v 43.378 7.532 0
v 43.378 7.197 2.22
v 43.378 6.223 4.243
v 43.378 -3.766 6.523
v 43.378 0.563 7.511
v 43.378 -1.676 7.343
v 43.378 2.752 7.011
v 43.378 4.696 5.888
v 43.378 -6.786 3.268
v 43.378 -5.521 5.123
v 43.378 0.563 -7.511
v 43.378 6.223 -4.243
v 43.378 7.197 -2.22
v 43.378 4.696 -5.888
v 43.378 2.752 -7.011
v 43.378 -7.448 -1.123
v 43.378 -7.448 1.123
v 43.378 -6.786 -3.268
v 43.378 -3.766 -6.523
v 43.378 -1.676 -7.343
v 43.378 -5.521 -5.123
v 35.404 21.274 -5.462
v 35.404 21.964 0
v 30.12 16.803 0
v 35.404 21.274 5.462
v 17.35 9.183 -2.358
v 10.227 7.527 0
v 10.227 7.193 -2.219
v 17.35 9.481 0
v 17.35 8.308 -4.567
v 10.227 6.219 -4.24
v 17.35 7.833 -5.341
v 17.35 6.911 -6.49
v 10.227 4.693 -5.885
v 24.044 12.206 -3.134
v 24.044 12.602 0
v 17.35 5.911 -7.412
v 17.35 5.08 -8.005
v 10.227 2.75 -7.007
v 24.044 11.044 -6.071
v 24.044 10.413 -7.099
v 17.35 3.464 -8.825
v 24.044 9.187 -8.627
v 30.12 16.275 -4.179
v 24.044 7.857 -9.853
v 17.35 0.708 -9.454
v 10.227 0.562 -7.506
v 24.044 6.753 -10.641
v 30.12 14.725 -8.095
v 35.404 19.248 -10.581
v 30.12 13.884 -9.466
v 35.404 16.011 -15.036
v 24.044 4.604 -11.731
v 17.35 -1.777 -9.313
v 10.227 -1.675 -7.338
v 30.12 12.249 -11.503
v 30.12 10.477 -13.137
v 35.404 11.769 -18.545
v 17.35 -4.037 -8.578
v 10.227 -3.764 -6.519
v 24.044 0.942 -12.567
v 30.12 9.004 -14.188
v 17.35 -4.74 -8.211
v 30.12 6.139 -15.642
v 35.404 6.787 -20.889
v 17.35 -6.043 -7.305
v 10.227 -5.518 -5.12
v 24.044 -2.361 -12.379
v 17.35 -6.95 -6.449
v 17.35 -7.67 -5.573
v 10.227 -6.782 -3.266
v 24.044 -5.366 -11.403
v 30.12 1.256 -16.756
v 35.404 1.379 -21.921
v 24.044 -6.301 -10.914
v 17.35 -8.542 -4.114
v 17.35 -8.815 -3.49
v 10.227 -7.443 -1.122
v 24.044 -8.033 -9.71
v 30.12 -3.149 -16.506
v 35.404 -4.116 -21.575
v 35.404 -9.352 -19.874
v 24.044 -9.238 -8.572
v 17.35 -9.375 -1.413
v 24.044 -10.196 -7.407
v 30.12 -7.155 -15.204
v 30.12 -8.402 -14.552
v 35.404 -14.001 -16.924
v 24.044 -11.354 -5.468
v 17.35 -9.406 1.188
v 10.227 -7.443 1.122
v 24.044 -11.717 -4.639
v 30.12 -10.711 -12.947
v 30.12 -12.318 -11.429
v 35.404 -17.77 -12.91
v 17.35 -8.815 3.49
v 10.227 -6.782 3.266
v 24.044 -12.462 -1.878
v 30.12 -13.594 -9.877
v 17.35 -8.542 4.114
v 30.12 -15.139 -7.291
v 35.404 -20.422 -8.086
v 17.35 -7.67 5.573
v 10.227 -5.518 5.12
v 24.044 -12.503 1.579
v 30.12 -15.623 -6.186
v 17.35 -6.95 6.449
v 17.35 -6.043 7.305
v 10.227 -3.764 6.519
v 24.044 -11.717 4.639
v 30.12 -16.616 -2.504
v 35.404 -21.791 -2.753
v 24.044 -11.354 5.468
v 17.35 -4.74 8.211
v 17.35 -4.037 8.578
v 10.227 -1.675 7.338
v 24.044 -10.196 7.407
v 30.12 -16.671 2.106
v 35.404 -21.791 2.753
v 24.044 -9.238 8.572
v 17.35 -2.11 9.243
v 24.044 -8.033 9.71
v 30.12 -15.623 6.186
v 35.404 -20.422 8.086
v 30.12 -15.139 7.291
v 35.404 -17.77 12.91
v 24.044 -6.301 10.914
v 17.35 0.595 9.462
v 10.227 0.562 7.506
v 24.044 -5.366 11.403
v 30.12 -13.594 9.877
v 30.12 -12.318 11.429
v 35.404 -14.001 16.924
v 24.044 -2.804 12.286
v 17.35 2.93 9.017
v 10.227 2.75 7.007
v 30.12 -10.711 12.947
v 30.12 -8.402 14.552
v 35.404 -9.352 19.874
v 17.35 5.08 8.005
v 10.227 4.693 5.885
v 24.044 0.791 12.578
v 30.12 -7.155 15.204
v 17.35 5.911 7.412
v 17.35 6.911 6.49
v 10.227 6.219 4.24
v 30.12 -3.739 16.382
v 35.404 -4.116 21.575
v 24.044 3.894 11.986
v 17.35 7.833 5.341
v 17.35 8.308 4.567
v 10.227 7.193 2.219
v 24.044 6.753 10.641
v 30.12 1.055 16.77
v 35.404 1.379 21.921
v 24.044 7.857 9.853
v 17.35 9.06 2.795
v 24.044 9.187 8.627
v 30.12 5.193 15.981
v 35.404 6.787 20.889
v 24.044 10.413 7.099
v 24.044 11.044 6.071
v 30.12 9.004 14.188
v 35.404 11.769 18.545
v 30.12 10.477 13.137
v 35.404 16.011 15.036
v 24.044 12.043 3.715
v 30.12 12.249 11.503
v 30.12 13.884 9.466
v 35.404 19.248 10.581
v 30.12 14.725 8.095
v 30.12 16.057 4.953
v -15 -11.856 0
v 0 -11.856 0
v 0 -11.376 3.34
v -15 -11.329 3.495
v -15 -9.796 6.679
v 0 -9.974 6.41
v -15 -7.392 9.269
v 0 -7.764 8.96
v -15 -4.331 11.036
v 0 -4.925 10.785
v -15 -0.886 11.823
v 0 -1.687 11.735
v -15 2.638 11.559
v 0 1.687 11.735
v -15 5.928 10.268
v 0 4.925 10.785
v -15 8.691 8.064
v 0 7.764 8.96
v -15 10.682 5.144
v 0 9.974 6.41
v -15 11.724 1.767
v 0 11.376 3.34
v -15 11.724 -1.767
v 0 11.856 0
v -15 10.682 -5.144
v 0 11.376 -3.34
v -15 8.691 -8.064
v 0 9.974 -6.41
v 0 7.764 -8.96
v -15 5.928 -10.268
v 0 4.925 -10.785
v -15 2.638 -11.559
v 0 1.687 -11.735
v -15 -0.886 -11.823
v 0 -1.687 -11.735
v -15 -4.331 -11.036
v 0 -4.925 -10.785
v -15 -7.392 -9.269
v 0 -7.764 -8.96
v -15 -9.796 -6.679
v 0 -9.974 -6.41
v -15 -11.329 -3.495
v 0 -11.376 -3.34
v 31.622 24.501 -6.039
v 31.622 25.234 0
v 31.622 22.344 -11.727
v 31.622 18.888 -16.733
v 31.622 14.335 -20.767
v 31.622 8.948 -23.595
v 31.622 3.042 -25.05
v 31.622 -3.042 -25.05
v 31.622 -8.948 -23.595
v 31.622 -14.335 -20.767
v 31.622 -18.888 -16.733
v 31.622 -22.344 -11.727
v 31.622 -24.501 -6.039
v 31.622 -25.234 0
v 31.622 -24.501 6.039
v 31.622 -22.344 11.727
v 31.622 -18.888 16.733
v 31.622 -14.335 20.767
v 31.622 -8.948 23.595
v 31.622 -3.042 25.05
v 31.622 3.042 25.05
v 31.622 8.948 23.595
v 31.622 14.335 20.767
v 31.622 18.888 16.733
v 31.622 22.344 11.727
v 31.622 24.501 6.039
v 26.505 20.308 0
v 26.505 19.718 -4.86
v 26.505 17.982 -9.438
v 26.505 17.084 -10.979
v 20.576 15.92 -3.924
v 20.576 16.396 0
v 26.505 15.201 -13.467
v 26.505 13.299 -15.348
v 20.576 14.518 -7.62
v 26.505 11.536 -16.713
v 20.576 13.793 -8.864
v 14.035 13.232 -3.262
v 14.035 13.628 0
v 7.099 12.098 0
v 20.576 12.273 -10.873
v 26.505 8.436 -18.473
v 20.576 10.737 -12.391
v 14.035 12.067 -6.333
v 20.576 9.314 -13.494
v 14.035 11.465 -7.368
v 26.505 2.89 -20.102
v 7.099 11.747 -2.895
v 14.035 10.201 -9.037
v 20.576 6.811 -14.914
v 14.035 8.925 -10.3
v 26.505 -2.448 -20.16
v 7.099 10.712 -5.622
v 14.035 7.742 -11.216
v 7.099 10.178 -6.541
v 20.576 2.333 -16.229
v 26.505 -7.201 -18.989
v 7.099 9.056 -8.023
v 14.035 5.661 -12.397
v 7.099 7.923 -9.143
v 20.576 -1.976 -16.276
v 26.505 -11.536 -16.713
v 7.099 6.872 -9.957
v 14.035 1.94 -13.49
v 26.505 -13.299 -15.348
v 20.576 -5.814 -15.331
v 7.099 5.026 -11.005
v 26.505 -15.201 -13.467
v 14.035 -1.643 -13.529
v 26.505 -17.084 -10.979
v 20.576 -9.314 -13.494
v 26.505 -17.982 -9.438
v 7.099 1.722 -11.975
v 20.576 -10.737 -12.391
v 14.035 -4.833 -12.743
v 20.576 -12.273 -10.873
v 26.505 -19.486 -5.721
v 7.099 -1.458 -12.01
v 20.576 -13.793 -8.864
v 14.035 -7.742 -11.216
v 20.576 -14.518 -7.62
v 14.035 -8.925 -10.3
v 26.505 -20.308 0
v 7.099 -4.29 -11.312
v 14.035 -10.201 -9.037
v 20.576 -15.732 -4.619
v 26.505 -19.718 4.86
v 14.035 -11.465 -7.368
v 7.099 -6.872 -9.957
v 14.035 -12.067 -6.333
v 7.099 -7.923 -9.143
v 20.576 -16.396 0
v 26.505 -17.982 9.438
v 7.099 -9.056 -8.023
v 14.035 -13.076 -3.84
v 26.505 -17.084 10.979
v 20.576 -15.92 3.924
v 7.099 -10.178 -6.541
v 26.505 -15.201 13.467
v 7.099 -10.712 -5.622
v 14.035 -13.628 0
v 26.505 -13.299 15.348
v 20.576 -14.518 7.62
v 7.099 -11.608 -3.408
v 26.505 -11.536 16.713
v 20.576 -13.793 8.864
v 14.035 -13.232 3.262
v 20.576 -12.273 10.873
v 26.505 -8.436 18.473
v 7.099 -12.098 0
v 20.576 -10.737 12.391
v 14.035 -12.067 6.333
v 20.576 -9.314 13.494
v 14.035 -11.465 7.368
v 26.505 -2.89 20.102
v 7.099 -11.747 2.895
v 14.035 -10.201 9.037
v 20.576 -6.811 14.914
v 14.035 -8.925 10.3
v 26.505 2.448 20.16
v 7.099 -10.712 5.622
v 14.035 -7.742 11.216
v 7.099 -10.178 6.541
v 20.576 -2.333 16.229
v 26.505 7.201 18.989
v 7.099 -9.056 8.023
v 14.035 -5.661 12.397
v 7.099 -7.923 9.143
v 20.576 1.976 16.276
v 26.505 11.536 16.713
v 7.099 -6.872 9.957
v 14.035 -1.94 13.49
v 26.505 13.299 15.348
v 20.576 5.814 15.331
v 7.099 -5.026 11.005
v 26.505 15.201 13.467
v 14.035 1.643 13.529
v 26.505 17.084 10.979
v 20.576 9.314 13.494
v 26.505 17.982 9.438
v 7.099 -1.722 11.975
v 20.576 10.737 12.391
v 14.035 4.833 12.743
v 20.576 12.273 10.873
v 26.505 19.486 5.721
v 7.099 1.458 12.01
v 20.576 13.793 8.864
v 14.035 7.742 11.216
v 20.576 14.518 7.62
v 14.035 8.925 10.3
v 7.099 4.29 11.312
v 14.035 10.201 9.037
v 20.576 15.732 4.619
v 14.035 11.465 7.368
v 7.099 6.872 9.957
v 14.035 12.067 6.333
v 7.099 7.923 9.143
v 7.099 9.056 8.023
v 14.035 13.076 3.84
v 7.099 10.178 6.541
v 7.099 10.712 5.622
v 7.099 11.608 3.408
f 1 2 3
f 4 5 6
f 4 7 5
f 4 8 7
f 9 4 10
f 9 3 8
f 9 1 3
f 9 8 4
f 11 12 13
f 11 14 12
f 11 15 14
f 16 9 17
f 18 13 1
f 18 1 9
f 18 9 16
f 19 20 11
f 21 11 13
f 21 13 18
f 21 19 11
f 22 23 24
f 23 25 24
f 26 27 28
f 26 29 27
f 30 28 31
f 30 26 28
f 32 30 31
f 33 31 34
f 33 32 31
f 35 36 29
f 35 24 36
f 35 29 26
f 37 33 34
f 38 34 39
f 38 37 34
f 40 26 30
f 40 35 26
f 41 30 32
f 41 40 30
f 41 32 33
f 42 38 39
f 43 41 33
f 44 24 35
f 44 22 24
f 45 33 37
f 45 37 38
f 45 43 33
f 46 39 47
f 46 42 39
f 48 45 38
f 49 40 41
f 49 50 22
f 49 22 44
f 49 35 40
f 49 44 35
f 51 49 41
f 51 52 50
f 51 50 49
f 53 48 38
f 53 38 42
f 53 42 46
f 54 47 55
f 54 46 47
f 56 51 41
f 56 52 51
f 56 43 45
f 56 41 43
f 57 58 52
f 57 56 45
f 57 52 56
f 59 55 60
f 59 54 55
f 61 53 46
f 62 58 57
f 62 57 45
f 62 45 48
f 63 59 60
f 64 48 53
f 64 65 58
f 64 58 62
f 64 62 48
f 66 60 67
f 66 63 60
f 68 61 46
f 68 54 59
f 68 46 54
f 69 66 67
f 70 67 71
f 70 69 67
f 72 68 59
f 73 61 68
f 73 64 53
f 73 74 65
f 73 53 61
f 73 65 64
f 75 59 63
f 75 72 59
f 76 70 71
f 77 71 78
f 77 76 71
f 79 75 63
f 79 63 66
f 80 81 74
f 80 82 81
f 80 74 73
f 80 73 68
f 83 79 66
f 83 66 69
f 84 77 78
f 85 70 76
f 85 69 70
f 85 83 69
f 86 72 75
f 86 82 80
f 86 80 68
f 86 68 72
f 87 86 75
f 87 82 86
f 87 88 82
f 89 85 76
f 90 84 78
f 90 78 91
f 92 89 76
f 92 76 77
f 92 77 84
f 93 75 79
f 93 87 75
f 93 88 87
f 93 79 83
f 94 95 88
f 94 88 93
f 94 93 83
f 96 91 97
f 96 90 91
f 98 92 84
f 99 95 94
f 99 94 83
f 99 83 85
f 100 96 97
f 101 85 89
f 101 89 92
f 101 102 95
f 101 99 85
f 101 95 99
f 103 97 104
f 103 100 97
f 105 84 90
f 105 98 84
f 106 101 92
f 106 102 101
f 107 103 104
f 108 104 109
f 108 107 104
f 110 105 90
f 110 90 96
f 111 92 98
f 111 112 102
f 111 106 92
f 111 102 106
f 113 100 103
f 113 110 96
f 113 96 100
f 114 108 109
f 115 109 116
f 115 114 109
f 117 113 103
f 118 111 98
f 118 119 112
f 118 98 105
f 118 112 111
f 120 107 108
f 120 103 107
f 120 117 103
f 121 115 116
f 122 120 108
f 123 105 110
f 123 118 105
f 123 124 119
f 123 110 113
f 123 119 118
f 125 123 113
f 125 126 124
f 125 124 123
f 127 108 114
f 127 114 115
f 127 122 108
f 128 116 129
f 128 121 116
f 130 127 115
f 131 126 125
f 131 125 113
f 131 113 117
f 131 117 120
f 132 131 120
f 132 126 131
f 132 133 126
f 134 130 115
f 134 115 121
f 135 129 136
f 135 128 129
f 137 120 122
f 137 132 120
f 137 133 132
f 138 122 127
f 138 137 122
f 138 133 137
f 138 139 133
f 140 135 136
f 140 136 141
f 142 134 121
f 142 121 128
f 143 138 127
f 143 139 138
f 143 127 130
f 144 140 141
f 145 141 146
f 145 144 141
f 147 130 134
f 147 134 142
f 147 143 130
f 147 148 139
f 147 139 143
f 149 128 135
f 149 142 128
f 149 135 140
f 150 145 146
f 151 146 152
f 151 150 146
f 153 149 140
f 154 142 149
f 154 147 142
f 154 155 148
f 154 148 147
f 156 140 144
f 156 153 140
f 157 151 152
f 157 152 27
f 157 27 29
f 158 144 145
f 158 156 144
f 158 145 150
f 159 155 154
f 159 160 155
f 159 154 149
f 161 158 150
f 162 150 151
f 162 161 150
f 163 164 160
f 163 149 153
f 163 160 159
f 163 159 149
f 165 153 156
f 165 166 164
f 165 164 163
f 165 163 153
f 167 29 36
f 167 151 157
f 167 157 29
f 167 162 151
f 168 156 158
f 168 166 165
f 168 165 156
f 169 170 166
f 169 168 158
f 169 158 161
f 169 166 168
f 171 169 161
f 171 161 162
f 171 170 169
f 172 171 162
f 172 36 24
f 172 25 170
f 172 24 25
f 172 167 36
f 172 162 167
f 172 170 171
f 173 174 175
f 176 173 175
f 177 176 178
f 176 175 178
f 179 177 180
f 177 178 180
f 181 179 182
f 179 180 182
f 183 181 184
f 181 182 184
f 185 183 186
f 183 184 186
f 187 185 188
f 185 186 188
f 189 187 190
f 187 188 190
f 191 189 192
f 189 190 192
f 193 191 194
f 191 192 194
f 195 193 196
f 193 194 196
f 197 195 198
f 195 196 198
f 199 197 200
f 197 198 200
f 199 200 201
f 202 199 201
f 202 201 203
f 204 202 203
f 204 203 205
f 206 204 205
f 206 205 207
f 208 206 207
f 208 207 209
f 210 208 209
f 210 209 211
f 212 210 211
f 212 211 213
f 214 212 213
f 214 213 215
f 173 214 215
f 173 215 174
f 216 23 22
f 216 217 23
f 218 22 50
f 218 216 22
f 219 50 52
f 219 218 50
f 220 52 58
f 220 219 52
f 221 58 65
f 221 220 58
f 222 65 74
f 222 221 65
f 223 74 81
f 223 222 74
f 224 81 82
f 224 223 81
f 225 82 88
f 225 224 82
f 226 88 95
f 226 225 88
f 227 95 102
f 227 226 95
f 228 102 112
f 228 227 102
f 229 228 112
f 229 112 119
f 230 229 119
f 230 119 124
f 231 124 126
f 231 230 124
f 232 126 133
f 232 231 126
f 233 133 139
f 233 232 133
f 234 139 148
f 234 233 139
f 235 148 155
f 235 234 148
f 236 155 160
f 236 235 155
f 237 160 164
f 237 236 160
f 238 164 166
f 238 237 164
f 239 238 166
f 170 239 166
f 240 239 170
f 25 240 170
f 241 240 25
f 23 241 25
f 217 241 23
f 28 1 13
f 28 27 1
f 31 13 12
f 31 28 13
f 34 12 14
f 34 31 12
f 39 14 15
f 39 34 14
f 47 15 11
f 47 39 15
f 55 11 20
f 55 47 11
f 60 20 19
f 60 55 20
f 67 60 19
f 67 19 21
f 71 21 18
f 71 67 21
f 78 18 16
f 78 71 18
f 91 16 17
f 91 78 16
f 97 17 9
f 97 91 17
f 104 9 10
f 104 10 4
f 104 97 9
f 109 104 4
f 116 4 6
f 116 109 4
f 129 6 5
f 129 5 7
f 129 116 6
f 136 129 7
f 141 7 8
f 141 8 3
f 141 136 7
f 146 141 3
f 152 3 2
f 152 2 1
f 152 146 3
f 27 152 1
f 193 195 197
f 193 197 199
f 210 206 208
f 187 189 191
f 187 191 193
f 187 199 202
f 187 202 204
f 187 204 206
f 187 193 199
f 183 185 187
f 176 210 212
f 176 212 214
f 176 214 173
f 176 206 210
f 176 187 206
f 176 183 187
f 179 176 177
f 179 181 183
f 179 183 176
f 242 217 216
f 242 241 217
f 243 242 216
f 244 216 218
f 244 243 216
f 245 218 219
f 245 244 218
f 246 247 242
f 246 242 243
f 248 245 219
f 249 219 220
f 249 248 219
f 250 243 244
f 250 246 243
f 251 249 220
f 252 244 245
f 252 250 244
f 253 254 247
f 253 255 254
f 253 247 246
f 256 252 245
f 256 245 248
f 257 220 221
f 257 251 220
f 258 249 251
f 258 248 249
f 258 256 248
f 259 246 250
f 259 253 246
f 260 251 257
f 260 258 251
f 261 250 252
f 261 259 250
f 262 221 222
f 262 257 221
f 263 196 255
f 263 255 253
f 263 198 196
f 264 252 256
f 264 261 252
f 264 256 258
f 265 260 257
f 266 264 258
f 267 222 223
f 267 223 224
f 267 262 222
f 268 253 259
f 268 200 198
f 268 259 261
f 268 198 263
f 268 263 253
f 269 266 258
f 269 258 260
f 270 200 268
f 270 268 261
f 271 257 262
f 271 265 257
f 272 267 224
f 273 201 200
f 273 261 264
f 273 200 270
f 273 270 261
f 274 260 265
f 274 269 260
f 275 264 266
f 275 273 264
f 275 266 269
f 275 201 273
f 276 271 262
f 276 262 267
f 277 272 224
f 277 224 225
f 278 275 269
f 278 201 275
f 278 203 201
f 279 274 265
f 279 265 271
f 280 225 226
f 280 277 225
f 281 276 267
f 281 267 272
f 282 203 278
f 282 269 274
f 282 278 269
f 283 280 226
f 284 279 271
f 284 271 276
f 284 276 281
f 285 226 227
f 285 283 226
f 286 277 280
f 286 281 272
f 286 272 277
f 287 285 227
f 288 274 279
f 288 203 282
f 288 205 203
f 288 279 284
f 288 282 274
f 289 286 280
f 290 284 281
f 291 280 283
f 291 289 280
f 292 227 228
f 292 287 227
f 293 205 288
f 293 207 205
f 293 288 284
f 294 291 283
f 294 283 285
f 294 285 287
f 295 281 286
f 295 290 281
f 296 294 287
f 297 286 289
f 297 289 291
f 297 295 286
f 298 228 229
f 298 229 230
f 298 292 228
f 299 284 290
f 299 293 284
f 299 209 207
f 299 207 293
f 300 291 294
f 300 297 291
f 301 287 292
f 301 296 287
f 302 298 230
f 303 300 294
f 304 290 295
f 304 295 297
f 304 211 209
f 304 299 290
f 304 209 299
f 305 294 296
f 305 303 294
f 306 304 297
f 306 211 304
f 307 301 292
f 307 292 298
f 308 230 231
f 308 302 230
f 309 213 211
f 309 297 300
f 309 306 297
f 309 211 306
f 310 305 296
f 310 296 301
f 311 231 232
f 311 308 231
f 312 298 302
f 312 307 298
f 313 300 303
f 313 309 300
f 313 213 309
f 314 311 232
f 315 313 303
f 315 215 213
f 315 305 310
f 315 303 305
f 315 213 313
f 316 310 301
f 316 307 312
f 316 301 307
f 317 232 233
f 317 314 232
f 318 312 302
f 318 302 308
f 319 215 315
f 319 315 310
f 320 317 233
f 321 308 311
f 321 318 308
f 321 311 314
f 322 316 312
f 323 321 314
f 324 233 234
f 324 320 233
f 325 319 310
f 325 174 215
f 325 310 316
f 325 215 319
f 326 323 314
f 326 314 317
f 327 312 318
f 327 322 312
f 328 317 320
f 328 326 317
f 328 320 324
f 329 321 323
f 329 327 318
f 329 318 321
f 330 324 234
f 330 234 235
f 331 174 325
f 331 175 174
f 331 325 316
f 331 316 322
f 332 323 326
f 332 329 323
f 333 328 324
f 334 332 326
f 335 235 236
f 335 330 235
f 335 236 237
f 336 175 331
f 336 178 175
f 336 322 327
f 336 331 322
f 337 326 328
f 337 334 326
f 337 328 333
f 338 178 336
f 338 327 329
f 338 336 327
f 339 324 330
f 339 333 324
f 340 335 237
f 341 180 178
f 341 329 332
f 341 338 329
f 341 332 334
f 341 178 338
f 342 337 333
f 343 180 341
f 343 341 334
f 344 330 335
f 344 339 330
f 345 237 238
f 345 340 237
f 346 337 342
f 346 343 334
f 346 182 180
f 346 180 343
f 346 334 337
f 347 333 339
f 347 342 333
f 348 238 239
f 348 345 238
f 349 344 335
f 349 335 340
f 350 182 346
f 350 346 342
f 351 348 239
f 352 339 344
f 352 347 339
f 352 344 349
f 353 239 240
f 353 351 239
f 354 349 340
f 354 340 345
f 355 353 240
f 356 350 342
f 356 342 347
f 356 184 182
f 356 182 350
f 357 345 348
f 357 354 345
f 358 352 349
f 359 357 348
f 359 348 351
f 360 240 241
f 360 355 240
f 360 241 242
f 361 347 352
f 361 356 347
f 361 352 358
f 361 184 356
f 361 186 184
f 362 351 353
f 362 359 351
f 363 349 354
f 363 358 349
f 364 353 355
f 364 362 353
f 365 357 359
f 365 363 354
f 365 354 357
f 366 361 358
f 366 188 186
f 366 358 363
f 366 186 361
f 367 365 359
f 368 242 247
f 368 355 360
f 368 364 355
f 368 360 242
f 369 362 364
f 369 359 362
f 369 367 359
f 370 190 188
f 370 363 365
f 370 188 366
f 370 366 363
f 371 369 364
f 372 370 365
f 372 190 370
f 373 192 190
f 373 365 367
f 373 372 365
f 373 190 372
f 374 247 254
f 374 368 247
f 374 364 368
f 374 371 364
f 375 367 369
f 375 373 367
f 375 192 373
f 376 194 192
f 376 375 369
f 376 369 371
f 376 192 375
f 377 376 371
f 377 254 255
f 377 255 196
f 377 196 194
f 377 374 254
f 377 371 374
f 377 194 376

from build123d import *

# Parameters (mm, degrees)
F1_FACE_R = 11.855998
F2_DEPTH  = 15


with BuildPart() as f1:
    # F0 (on Top) → F1 (revolve)
    with BuildSketch(Plane.XY):
        with BuildLine():
            Line((0, 6.848679), (0, 0))
            Line((0, 0), (43.378383, 0))
            Line((43.378383, 0), (43.378383, 2.531673))
            Line((43.378383, 2.531673), (43.378383, 7.531673))
            Line((43.378383, 7.531673), (10.226769, 7.527062))
            ThreePointArc((10.226769, 7.527062), (24.044458, 12.602389), (35.404081, 21.964357))
            Line((35.404081, 21.964357), (31.621624, 25.234375))
            ThreePointArc((31.621624, 25.234375), (17.368897, 14.862439), (0, 11.855998))
            Line((0, 11.855998), (0, 6.848679))
        make_face()
    revolve(axis=Axis((21.689191, 0, 0), (-1, 0, 0)))

    # F1_face (on face) → F2 (join)
    with BuildSketch(Plane(origin=(0, 0, 0), x_dir=(0, -1, 0), z_dir=(-1, 0, 0))):
        Circle(F1_FACE_R)
    extrude(amount=F2_DEPTH)


solid = f1.part
